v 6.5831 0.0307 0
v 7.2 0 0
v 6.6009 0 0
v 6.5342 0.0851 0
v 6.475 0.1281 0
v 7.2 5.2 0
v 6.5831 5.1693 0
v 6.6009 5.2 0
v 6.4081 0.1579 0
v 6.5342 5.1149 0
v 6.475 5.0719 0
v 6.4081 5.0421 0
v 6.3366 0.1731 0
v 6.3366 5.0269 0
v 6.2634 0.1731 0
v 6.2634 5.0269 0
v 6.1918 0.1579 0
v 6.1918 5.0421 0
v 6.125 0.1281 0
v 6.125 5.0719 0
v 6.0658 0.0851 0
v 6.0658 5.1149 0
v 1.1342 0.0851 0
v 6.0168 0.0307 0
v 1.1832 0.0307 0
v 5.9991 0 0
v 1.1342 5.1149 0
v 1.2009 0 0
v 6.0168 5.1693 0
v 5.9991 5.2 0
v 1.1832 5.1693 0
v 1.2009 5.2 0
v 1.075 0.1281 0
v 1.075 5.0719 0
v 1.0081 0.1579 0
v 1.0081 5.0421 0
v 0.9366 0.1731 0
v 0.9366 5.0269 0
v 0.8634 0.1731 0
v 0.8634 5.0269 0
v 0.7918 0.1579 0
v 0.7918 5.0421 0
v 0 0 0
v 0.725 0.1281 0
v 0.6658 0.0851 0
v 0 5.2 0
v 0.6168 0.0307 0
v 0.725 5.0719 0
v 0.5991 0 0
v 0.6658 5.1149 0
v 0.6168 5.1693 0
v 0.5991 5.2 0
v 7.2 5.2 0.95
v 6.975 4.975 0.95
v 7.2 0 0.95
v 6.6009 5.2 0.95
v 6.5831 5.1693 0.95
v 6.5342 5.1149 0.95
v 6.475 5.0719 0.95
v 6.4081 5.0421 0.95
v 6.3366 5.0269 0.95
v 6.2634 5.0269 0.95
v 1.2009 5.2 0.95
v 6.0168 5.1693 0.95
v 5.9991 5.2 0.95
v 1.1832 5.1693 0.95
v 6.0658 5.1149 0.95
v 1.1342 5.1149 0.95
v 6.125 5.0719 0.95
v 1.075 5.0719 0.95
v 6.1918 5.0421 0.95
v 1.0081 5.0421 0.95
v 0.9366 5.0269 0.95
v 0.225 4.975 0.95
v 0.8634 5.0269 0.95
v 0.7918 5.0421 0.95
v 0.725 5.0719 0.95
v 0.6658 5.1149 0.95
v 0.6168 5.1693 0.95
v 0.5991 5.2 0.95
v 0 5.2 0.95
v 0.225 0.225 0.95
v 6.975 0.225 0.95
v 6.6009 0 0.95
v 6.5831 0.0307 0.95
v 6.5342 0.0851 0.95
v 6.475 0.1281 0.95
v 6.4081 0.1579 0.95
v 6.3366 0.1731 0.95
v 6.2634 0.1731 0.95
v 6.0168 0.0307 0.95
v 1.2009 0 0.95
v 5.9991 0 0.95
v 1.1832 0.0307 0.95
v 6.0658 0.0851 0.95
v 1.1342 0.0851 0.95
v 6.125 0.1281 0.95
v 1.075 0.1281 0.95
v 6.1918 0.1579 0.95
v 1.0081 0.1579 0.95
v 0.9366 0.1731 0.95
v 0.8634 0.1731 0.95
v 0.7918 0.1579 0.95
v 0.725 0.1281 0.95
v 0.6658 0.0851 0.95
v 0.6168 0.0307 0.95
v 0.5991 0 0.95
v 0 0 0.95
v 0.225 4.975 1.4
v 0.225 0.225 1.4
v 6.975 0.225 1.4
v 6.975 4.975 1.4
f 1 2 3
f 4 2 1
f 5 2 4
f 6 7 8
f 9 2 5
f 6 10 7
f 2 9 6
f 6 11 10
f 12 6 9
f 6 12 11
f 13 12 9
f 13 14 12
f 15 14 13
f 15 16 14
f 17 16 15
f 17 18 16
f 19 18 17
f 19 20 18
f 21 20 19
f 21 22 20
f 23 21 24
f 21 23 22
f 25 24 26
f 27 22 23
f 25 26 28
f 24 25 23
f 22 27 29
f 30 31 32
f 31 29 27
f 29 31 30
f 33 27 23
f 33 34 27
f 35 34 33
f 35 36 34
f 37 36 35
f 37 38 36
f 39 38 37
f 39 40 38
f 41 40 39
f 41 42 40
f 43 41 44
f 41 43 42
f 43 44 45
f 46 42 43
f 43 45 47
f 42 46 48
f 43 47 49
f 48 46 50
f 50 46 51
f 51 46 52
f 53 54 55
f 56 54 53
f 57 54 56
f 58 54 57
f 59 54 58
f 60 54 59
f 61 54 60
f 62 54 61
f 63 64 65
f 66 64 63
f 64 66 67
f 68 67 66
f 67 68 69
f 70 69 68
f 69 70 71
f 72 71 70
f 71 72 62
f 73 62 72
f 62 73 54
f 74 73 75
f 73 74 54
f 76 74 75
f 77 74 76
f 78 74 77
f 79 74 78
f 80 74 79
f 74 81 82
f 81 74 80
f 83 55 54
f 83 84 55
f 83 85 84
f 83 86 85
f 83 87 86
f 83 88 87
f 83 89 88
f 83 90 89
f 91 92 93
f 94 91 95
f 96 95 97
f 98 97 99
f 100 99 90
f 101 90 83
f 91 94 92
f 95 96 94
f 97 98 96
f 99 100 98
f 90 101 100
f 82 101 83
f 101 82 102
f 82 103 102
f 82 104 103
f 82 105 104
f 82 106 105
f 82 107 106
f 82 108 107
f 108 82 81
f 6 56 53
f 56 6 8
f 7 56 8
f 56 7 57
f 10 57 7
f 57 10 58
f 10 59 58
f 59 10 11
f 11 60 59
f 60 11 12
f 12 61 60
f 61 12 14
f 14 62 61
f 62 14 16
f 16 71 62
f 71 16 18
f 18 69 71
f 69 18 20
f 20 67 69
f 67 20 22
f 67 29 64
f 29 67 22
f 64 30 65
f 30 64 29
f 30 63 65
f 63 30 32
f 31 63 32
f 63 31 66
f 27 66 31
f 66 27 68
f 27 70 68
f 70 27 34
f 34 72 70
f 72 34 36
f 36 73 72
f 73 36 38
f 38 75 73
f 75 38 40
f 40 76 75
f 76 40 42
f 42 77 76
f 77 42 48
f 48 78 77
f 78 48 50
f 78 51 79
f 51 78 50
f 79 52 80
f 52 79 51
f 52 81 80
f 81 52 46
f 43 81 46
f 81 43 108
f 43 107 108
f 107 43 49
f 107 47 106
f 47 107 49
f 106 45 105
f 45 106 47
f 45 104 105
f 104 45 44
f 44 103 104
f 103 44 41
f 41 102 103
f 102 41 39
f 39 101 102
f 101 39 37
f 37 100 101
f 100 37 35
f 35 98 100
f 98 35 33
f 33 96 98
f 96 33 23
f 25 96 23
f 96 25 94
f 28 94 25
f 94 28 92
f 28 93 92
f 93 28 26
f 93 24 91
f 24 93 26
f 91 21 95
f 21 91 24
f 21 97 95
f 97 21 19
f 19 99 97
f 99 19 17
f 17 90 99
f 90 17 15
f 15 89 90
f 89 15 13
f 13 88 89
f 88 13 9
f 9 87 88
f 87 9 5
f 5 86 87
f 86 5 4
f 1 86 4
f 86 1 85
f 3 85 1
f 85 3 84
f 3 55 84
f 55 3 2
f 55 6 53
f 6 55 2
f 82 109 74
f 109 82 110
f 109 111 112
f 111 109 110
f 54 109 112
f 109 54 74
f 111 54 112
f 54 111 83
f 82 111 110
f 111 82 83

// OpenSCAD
// Values taken from datasheet
// https://www.tme.eu/Document/a279748d7142c2d68b83afb59e3ef975/LFSPXO018035.pdf
PAD_WIDTH        = 1.8;
PAD_HEIGHT       = 1.6;

CHASSIS_X_LENGTH = 7.2;
CHASSIS_Y_LENGTH = 5.2;
CHASSIS_Z_LENGTH = 1.4;

// Not very importnat values, no info in datasheet
LID_HEIGHT = 0.85;
LID_TO_EDGE_DISTANCE=0.45;

PAD_CIRCLE_RADIUS = 0.35;

// Increase steps in render to have quality circles
$fs=0.01;

module BottomPart() {
   // linear_extrude(height = CHASSIS_Z_LENGTH, center = true, convexity = 10, twist = 0)
    difference() {
        square([CHASSIS_X_LENGTH,CHASSIS_Y_LENGTH]);
            
        union () {
            translate([PAD_WIDTH/2, CHASSIS_Y_LENGTH + PAD_CIRCLE_RADIUS/2, 0])
                circle(r=PAD_CIRCLE_RADIUS);

            translate([CHASSIS_X_LENGTH - PAD_WIDTH/2, CHASSIS_Y_LENGTH + PAD_CIRCLE_RADIUS/2, 0])
                circle(PAD_CIRCLE_RADIUS);

            translate([PAD_WIDTH/2, - PAD_CIRCLE_RADIUS/2, 0])
                circle(PAD_CIRCLE_RADIUS);

            translate([CHASSIS_X_LENGTH - PAD_WIDTH/2, - PAD_CIRCLE_RADIUS/2, 0])
                circle(PAD_CIRCLE_RADIUS);
        }
    }
}


module TopPart()
{
translate([LID_TO_EDGE_DISTANCE/2, LID_TO_EDGE_DISTANCE/2, 0])
    square([CHASSIS_X_LENGTH - LID_TO_EDGE_DISTANCE,CHASSIS_Y_LENGTH - LID_TO_EDGE_DISTANCE]);
}



union() {
linear_extrude(height = CHASSIS_Z_LENGTH-LID_TO_EDGE_DISTANCE, convexity = 10, twist = 0)
    BottomPart();

linear_extrude(height = CHASSIS_Z_LENGTH, convexity = 10, twist = 0)
    TopPart();
}
